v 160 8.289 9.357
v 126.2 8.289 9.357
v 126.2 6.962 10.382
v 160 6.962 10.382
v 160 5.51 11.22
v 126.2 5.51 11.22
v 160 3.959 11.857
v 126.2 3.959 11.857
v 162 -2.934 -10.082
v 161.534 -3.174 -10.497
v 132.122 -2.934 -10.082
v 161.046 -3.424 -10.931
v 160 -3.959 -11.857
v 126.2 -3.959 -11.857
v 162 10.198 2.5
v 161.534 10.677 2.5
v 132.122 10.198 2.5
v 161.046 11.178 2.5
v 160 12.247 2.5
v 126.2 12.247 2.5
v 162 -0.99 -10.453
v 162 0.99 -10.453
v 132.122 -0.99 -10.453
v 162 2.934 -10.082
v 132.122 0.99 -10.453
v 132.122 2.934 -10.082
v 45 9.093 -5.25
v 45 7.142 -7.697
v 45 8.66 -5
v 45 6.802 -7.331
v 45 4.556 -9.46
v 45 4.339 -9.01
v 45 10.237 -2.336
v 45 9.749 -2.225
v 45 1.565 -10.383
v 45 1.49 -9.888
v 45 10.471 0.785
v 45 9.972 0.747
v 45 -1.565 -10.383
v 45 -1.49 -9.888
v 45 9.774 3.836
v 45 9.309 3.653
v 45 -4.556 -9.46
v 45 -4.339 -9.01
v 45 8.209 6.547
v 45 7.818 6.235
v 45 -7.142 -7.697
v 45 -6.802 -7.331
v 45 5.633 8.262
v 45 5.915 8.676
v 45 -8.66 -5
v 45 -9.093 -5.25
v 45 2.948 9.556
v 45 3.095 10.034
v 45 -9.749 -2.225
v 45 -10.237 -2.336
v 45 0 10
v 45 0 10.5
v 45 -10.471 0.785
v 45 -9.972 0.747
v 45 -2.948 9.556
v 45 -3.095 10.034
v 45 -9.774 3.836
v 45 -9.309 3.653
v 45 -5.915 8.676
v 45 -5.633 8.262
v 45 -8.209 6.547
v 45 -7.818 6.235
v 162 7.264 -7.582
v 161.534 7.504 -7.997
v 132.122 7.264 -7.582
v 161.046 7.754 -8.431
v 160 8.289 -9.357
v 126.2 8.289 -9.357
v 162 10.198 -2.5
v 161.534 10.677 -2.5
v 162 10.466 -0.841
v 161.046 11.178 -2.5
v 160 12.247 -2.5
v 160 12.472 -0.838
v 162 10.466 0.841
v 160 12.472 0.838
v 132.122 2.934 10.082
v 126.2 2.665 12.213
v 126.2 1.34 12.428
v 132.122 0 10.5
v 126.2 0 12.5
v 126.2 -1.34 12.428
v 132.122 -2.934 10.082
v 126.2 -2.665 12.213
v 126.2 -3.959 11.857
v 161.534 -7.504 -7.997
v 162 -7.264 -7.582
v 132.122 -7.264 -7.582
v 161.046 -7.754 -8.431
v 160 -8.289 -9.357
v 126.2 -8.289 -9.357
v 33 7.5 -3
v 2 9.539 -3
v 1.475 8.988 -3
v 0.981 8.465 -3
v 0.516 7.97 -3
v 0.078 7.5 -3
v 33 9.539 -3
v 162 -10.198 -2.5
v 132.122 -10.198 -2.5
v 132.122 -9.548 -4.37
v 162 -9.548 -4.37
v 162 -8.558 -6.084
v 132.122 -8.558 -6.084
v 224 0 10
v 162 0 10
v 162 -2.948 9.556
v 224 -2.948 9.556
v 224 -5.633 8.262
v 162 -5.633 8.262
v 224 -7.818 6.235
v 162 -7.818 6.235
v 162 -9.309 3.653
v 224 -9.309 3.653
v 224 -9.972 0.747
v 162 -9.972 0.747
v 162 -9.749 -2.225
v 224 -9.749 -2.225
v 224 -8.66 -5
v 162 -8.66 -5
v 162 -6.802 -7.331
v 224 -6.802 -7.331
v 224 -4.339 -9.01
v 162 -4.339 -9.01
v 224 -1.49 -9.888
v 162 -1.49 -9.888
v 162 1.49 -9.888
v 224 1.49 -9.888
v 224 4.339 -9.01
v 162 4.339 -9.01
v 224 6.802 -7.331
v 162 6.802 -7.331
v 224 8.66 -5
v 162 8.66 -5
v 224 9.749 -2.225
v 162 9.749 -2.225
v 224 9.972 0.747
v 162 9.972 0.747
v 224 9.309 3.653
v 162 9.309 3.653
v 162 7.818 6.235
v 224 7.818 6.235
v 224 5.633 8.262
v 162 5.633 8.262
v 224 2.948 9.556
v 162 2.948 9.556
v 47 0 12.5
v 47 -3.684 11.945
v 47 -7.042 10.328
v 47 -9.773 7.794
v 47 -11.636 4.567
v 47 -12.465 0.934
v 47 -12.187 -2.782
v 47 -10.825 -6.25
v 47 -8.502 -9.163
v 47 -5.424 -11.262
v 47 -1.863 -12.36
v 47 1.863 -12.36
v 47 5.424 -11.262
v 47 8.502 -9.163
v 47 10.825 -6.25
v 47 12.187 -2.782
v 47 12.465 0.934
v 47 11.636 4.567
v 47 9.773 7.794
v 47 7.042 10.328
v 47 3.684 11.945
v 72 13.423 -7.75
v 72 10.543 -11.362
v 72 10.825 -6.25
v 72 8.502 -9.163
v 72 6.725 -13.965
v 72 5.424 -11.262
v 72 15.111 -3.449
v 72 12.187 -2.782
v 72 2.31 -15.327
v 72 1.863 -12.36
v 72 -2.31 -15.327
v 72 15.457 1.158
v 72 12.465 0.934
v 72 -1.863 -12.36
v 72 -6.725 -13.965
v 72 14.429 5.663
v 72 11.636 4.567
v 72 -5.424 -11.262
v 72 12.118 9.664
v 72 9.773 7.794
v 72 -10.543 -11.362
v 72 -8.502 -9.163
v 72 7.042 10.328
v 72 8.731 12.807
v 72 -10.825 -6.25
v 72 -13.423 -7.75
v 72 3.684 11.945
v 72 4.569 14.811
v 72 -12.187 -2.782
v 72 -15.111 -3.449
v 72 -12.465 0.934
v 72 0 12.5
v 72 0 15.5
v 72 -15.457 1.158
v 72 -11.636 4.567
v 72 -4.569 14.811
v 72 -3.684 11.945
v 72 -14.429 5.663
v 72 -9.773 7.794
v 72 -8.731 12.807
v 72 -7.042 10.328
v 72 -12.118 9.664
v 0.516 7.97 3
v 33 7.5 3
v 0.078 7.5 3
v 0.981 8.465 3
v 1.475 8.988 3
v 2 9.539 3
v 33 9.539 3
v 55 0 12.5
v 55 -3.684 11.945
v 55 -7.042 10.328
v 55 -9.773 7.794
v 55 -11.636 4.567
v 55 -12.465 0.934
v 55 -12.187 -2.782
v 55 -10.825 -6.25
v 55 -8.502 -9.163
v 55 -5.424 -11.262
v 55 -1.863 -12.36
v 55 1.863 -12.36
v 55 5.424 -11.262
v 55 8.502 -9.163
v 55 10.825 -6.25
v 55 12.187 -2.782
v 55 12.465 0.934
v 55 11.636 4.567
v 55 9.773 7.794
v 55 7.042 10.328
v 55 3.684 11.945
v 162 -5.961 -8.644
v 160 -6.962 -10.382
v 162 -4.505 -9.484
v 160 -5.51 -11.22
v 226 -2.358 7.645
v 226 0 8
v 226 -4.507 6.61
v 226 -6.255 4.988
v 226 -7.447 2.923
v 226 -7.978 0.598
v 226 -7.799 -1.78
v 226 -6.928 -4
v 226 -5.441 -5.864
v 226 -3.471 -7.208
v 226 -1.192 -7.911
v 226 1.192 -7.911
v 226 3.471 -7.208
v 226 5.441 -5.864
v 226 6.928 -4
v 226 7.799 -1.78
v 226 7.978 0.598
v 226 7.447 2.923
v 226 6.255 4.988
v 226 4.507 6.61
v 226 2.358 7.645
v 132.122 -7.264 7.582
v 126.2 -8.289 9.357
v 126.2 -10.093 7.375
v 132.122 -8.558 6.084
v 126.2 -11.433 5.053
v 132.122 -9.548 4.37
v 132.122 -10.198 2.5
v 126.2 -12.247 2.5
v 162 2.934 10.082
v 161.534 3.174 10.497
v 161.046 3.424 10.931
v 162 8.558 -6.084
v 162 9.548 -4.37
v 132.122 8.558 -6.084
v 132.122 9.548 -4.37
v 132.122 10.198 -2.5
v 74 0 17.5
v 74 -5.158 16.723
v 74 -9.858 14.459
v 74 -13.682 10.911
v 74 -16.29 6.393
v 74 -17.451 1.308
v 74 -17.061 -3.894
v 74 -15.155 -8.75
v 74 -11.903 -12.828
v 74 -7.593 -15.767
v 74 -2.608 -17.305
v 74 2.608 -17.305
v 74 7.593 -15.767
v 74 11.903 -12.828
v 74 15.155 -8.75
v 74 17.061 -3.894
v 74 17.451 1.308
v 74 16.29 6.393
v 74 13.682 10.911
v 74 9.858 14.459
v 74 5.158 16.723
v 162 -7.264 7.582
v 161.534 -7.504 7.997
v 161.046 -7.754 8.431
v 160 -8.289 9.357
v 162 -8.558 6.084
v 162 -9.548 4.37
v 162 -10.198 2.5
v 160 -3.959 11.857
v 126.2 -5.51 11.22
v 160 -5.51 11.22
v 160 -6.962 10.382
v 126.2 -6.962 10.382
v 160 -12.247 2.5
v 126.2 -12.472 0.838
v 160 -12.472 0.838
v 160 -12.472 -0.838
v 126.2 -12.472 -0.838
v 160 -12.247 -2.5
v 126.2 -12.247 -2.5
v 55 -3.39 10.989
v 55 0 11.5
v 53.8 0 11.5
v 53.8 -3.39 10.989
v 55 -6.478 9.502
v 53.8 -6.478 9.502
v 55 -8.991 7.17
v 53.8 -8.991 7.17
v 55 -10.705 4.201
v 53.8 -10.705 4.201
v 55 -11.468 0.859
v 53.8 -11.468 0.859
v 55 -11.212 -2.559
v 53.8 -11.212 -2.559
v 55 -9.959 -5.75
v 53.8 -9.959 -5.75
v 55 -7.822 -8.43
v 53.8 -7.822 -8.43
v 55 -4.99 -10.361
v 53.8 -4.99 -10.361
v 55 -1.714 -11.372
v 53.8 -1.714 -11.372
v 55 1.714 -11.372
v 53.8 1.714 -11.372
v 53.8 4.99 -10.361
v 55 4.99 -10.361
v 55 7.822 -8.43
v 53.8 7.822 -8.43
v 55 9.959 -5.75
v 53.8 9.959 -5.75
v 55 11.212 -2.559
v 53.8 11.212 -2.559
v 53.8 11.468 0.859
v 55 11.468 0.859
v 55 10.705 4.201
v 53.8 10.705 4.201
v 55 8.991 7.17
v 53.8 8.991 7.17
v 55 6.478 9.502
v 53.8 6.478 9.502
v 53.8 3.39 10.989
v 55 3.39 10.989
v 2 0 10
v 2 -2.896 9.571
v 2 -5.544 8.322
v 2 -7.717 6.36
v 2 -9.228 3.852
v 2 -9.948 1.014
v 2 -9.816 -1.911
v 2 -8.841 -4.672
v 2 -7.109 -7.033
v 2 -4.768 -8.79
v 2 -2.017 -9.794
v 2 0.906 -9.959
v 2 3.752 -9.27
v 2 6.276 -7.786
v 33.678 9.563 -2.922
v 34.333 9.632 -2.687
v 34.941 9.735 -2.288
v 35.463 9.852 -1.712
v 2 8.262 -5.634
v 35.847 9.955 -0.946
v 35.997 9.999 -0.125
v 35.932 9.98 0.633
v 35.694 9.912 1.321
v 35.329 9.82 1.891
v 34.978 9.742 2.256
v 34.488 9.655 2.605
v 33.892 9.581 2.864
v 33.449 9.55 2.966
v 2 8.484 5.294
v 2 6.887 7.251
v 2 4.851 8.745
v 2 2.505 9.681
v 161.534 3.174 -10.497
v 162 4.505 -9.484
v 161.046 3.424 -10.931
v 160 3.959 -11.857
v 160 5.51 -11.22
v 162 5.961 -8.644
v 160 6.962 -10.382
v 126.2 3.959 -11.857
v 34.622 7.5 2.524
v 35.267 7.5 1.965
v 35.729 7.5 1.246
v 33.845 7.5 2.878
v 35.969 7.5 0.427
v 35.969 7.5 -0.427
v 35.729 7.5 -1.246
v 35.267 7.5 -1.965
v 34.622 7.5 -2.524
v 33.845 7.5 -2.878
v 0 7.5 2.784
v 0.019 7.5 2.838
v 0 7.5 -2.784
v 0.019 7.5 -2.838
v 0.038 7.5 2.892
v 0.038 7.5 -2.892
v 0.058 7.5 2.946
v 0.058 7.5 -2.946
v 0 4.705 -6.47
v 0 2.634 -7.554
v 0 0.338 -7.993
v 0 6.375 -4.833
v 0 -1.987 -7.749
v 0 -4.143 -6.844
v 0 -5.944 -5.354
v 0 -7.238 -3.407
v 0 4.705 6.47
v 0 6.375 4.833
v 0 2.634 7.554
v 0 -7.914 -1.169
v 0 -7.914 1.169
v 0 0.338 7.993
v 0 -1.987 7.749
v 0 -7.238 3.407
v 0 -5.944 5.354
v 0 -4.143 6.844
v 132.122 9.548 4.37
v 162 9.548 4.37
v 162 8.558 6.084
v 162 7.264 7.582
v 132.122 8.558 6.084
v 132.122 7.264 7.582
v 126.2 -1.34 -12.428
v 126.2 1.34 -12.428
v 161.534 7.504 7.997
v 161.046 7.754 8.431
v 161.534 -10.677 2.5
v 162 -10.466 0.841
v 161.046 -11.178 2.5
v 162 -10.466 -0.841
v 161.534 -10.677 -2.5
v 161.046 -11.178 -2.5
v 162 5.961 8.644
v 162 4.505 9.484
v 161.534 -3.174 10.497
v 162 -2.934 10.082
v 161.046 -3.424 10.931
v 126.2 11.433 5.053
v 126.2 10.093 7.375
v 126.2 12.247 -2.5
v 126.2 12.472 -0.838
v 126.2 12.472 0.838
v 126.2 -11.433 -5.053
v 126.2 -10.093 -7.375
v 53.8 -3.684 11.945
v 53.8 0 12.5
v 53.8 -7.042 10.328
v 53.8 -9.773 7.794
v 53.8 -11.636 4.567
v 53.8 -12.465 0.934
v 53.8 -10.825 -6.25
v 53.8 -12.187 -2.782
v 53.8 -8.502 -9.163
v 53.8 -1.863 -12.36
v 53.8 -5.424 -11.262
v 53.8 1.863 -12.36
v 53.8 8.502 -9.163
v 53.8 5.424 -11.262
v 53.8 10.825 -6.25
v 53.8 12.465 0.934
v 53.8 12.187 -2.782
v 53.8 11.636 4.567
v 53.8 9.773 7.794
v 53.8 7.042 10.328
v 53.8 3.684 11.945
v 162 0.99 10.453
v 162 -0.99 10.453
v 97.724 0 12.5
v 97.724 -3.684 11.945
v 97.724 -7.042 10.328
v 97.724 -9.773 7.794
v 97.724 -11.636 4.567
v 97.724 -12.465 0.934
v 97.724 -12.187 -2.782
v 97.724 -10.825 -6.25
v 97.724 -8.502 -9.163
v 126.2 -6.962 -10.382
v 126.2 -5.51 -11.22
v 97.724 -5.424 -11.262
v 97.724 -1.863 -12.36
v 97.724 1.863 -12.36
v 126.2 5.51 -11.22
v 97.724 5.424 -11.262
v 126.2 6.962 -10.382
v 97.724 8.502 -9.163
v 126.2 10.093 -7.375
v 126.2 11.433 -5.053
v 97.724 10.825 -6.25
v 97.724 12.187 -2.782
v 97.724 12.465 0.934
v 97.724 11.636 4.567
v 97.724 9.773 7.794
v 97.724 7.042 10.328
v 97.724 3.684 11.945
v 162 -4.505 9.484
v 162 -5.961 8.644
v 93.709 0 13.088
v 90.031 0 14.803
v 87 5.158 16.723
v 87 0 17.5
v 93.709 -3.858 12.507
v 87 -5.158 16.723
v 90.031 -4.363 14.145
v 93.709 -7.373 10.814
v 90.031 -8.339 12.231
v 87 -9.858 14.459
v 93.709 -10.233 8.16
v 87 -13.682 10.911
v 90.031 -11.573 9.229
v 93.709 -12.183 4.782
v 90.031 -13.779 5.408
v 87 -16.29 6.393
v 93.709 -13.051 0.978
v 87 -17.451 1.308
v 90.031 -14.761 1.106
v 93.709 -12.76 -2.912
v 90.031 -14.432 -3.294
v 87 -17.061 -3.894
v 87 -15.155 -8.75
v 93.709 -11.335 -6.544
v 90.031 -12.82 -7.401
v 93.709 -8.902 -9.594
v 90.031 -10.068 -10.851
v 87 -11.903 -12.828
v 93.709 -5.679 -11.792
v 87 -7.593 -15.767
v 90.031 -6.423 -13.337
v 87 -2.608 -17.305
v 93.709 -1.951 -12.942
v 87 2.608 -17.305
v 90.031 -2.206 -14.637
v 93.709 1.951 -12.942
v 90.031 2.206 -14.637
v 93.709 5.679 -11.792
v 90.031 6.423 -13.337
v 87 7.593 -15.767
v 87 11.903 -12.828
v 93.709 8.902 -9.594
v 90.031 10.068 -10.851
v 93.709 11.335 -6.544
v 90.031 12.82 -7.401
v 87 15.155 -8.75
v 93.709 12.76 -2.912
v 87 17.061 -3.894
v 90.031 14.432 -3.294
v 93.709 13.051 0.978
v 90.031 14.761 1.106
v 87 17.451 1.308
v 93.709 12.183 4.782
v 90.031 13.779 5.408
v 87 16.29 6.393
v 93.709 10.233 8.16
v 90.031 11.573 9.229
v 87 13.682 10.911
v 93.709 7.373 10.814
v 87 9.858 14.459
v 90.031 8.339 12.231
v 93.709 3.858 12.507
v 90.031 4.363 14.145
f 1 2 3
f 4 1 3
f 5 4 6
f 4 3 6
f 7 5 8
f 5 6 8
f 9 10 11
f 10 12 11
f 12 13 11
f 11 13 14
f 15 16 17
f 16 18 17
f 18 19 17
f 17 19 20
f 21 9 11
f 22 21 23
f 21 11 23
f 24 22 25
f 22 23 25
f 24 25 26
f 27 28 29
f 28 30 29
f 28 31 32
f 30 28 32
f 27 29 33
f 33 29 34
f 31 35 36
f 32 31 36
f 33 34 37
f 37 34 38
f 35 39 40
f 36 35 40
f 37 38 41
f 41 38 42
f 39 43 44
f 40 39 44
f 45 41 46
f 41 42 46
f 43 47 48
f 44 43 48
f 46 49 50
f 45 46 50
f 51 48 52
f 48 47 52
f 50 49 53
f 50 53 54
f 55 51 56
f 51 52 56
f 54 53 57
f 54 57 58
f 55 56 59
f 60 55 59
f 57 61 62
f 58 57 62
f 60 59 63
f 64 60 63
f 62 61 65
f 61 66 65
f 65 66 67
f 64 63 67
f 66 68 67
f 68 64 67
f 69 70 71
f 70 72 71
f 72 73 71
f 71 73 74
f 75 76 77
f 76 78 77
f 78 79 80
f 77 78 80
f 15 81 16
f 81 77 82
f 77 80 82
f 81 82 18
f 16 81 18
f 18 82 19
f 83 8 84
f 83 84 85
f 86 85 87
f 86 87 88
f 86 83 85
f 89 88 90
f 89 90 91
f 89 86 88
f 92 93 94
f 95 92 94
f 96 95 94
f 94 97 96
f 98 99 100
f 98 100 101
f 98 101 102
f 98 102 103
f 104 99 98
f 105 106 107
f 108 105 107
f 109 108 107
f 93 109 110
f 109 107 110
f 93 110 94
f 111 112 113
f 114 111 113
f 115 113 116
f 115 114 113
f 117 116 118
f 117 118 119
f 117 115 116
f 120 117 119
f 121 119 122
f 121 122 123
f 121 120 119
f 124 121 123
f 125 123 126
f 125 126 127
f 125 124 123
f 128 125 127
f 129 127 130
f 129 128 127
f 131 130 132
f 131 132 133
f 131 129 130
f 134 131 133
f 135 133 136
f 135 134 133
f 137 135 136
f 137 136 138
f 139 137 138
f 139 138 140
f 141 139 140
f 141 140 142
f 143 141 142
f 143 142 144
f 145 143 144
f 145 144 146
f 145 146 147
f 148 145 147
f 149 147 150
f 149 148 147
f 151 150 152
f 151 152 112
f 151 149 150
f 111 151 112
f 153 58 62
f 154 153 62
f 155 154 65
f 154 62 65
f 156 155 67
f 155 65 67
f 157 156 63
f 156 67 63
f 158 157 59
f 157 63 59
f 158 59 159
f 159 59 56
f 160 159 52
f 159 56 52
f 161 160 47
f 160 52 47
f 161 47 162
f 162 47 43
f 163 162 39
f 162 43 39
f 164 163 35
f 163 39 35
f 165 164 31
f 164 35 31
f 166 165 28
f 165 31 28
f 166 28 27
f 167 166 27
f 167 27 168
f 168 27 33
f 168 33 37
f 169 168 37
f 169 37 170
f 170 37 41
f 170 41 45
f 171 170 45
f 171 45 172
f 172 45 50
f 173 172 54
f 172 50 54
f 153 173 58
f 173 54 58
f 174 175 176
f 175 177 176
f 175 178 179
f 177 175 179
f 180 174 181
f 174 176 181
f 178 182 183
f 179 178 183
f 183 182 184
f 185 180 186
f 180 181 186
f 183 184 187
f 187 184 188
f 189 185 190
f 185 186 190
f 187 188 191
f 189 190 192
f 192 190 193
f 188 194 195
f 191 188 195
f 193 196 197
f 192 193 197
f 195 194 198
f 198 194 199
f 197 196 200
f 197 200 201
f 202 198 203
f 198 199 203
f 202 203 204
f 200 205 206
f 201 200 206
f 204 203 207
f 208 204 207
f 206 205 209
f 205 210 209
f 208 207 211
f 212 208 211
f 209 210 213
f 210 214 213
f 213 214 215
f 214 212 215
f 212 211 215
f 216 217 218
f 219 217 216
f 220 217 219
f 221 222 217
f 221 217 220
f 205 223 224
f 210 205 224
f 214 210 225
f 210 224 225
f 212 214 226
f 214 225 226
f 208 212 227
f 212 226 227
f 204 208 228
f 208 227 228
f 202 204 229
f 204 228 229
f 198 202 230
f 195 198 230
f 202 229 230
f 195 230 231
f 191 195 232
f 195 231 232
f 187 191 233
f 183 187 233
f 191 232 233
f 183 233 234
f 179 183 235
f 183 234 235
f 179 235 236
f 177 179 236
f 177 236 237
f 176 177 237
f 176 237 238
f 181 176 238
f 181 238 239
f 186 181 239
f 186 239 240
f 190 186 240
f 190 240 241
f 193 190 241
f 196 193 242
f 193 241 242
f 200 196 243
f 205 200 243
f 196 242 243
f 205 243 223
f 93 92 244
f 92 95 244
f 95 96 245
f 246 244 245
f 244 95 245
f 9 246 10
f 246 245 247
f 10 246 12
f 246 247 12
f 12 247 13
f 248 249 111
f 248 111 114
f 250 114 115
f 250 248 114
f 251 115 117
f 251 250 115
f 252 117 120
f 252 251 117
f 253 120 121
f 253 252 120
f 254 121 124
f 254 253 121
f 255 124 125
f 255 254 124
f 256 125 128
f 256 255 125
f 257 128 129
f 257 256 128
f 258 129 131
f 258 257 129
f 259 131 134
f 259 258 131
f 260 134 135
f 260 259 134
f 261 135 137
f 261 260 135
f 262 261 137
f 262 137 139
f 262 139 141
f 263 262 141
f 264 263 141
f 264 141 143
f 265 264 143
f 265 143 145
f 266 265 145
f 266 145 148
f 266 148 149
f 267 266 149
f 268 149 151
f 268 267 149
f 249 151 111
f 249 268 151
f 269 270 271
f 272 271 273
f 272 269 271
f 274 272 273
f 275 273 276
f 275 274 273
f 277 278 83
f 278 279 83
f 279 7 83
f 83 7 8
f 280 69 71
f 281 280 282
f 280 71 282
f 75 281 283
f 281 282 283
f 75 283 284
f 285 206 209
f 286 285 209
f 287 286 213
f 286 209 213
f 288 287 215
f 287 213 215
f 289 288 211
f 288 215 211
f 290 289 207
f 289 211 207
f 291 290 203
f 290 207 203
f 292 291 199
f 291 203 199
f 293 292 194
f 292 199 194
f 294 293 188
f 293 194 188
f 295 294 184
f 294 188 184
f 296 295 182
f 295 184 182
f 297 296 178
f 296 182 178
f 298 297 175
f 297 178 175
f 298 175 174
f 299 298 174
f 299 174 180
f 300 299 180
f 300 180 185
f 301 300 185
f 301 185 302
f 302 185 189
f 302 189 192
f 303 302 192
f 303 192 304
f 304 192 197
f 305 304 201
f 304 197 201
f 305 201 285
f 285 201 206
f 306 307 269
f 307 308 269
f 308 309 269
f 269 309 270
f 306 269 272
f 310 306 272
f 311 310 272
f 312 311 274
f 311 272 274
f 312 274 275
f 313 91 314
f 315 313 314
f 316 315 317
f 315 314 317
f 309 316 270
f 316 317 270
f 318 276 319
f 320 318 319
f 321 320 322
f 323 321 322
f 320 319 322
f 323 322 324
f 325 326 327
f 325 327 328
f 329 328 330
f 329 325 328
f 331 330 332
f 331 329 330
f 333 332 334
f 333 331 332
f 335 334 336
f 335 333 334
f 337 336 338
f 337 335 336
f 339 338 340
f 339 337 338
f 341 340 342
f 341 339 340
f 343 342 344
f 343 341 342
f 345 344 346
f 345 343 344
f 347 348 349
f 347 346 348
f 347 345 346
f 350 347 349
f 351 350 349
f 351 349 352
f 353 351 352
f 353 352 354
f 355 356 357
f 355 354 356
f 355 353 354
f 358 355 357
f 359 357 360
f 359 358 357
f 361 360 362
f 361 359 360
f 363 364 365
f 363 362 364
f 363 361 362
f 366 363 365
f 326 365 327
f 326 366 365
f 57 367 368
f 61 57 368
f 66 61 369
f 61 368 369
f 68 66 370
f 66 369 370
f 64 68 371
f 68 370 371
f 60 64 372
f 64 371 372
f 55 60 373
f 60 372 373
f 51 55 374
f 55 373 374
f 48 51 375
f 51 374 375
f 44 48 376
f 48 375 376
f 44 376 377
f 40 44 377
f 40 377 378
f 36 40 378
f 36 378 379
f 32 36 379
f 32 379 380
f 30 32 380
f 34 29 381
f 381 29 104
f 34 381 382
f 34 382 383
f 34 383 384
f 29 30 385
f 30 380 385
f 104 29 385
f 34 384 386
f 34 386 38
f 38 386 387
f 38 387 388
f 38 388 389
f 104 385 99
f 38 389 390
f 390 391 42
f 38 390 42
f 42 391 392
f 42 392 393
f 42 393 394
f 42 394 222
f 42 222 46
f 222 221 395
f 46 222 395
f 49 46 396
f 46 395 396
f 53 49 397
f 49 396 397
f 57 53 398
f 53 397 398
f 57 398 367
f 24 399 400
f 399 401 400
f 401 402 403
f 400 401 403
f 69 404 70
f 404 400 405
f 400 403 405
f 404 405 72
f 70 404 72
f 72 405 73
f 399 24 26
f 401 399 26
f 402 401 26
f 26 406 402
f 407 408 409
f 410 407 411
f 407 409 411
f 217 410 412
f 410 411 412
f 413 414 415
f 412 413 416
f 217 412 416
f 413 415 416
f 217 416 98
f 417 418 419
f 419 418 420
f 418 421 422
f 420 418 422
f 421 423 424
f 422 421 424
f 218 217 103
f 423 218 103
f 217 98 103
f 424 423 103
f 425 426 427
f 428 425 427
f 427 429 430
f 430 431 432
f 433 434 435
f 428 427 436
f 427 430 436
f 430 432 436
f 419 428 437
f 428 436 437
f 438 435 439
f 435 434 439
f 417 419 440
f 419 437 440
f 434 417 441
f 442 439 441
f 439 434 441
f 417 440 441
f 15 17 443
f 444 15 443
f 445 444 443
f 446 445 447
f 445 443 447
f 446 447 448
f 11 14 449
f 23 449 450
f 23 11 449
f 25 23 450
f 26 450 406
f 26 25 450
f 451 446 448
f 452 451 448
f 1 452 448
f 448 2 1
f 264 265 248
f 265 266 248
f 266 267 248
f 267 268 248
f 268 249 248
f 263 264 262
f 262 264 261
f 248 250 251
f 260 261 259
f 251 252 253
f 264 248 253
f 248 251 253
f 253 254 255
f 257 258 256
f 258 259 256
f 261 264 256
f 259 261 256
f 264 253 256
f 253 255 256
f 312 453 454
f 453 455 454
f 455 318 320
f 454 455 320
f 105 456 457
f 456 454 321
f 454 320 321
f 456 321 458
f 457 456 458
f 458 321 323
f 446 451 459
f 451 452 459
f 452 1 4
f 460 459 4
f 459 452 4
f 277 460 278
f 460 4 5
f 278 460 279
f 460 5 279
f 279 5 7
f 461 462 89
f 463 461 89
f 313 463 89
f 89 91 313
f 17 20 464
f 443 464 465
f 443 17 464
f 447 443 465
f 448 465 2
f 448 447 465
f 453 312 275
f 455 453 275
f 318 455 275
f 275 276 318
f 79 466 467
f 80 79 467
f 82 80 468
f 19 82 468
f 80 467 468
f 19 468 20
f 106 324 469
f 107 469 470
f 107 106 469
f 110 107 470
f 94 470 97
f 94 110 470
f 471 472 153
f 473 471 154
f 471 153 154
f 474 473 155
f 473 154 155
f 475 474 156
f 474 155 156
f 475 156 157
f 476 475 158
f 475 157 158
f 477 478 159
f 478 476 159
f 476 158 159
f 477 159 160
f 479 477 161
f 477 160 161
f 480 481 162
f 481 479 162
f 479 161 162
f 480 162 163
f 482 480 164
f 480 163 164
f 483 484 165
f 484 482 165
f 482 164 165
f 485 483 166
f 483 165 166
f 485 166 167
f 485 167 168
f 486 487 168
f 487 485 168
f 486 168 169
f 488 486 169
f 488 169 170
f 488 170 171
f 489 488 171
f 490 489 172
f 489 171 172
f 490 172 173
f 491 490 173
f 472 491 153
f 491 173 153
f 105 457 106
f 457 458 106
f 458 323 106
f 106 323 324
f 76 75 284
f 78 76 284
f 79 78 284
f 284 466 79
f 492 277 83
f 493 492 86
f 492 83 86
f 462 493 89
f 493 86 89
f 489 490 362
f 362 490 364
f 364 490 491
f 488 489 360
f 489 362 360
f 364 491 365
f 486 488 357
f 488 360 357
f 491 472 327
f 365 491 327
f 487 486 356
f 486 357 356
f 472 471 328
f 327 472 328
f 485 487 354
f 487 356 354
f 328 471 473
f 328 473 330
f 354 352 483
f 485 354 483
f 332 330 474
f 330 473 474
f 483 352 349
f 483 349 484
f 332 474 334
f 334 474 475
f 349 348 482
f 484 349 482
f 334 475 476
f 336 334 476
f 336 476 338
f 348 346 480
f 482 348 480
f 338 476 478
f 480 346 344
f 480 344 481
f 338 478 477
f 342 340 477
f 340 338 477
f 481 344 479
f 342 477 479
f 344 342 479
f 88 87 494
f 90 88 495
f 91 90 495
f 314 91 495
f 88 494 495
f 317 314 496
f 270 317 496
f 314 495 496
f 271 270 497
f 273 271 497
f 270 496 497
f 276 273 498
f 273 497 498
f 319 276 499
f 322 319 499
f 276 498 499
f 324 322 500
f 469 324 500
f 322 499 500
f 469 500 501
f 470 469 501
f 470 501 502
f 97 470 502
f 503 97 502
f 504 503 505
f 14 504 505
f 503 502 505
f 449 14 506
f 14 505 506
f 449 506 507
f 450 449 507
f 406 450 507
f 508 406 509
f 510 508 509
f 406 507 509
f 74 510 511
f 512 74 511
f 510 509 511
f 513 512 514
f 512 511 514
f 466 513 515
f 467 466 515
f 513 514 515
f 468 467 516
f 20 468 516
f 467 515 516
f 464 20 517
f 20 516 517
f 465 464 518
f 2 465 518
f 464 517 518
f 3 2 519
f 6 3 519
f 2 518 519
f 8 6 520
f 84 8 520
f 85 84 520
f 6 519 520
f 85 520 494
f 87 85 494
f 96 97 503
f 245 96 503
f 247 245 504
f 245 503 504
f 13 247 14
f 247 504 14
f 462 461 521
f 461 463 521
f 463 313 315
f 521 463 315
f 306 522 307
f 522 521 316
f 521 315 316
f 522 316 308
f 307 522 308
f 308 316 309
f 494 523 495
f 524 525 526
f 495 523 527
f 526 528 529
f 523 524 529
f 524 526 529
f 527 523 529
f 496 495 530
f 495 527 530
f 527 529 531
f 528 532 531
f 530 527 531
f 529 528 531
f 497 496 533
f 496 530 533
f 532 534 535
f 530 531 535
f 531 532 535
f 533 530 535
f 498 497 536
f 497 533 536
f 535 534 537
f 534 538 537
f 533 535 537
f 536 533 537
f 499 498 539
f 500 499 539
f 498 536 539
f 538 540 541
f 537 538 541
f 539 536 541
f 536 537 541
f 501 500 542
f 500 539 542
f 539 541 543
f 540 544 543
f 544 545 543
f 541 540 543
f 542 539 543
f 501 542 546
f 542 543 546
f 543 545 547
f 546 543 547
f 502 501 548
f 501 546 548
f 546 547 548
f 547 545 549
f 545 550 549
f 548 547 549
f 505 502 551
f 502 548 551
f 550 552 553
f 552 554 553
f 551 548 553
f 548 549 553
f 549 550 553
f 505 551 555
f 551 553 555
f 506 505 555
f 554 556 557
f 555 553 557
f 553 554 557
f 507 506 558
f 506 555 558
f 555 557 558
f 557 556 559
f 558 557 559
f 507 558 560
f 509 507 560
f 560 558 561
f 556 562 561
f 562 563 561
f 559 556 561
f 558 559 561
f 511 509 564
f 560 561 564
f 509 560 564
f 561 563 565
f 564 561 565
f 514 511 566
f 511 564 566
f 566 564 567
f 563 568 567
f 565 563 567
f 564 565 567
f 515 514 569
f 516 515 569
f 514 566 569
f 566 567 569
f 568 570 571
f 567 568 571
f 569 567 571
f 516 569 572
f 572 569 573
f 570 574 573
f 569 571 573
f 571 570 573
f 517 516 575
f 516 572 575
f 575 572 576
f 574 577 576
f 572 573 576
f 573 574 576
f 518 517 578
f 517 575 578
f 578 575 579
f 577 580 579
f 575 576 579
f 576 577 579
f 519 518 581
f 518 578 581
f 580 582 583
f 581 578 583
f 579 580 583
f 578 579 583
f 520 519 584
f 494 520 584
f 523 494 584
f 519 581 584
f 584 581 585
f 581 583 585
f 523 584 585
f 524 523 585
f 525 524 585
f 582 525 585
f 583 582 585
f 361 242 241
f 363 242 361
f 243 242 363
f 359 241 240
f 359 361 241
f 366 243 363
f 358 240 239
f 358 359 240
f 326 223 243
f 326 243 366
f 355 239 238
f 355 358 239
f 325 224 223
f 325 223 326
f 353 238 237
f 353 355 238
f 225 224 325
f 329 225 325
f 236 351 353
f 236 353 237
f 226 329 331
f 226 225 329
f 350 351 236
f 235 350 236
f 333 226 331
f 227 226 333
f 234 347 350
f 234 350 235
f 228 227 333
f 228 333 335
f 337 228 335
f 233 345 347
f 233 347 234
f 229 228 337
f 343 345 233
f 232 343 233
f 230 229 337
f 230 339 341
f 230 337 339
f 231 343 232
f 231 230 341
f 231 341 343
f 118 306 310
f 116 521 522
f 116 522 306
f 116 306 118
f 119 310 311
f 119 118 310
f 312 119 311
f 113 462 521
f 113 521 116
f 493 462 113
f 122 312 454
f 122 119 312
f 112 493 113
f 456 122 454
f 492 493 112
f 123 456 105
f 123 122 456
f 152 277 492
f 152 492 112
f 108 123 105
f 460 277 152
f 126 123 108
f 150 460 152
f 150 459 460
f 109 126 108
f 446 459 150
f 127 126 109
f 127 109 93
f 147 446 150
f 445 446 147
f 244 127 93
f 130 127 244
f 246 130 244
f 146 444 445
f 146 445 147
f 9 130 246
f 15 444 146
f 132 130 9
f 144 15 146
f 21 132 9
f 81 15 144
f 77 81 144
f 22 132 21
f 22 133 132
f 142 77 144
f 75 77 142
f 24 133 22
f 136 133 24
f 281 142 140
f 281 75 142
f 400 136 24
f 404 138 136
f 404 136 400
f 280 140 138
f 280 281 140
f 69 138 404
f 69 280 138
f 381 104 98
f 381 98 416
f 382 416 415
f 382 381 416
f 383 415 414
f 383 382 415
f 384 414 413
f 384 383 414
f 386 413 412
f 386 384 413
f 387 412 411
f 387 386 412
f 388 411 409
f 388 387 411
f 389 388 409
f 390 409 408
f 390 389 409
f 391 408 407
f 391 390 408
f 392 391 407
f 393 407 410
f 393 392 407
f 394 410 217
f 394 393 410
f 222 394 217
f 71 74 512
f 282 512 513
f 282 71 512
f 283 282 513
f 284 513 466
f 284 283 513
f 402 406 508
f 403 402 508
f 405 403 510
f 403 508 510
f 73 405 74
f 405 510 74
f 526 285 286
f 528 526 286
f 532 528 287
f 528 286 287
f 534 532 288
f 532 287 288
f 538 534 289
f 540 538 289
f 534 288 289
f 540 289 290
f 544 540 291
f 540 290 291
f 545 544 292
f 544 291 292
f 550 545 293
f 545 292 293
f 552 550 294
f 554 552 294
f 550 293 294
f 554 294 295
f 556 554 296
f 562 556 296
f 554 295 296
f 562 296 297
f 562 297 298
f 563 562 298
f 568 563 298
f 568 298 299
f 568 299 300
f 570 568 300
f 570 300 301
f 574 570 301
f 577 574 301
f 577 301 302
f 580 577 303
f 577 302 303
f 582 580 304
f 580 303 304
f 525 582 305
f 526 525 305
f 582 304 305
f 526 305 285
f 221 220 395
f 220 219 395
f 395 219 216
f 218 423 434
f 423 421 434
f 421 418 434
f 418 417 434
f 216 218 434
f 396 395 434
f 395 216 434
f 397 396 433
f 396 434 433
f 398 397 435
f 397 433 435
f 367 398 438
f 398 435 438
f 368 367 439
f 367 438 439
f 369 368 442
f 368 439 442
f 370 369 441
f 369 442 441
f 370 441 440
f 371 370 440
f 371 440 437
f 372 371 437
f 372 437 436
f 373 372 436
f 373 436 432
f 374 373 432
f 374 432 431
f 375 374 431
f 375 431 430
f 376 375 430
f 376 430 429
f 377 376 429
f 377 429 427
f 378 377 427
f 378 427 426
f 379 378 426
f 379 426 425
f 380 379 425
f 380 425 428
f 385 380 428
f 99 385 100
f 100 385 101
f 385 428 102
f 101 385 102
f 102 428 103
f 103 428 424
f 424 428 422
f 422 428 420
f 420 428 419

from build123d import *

# Parameters (mm, degrees)
CUT_EXTRUDE_START   = 10
CUT_EXTRUDE_1_DEPTH = 2.5
SKETCH_4_W          = 1.2
SKETCH_4_H          = 1
EXTRUDE_START       = -99.8
EXTRUDE_11_DEPTH    = 35.8
CHAMFER_1_SIZE      = 2


with BuildPart() as part:
    # 草图1 → 旋转1 (revolve)
    with BuildSketch(Plane.XY, mode=Mode.PRIVATE) as revolve_1_sk:
        with BuildLine():
            Line((0, 10), (0, 0))
            Line((0, 0), (226, 0))
            Line((226, 0), (226, 10))
            Line((226, 10), (162, 10))
            Line((162, 10), (162, 12.5))
            Line((162, 12.5), (97.723805295, 12.5))
            ThreePointArc((97.723805295, 12.5), (91.807725512, 13.81142246), (87, 17.5))
            Line((87, 17.5), (72, 17.5))
            Line((72, 17.5), (72, 12.5))
            Line((72, 12.5), (45, 12.5))
            Line((45, 12.5), (45, 10))
            Line((45, 10), (0, 10))
        make_face()
    revolve(revolve_1_sk.sketch.rotate(Axis((0, 0, 0), (1, 0, 0)), 90), axis=Axis((0, 0, 0), (1, 0, 0)))

    # 草图3 → 切除-拉伸1 (cut)
    with BuildSketch(Plane(origin=(0, 0, 0), x_dir=(1, 0, 0), z_dir=(0, 1, 0)).offset(CUT_EXTRUDE_START)):
        with BuildLine():
            Line((-33, 3), (33, 3))
            ThreePointArc((33, 3), (36, 0), (33, -3))
            Line((33, -3), (-33, -3))
            ThreePointArc((-33, -3), (-36, 0), (-33, 3))
        make_face()
    extrude(amount=-CUT_EXTRUDE_1_DEPTH, mode=Mode.SUBTRACT)

    # 草图4 → 切除-旋转1 (revolve, cut)
    with BuildSketch(Plane.XY, mode=Mode.PRIVATE) as cut_revolve_1_sk:
        with Locations((54.4, 12)):
            Rectangle(SKETCH_4_W, SKETCH_4_H)
        with Locations((54.4, -12)):
            Rectangle(SKETCH_4_W, SKETCH_4_H)
    revolve(cut_revolve_1_sk.sketch.rotate(Axis((0, 0, 0), (1, 0, 0)), 90), axis=Axis((0, 0, 0), (1, 0, 0)), mode=Mode.SUBTRACT)

    # 草图5 → 切除-旋转2 (revolve, cut)
    with BuildSketch(Plane.XY, mode=Mode.PRIVATE) as cut_revolve_2_sk:
        with BuildLine():
            Line((162, 12.5), (126.2, 12.5))
            ThreePointArc((126.2, 12.5), (131.507077415, 10.633014138), (137.097247359, 10))
            Line((137.097247359, 10), (162, 10))
            Line((162, 10), (162, 12.5))
        make_face()
    revolve(cut_revolve_2_sk.sketch.rotate(Axis((0, 0, 0), (1, 0, 0)), 90), axis=Axis((0, 0, 0), (1, 0, 0)), mode=Mode.SUBTRACT)

    # 草图8 → 凸台-拉伸11 (add)
    with BuildSketch(Plane(origin=(226, 0, 0), x_dir=(0, 0, -1), z_dir=(1, 0, 0)).offset(EXTRUDE_START)):
        with BuildLine():
            Line((9.356601718, 8.288787866), (7.581760866, 7.264083023))
            ThreePointArc((7.581760866, 7.264083023), (5.25, 9.09326674), (2.5, 10.198039027))
            Line((2.5, 10.198039027), (2.5, 12.247448714))
            ThreePointArc((2.5, 12.247448714), (0, 12.5), (-2.5, 12.247448714))
            Line((-2.5, 12.247448714), (-2.5, 10.198039027))
            ThreePointArc((-2.5, 10.198039027), (-5.25, 9.09326674), (-7.581760866, 7.264083023))
            Line((-7.581760866, 7.264083023), (-9.356601718, 8.288787866))
            ThreePointArc((-9.356601718, 8.288787866), (-10.825317547, 6.25), (-11.856601718, 3.958660847))
            Line((-11.856601718, 3.958660847), (-10.081760866, 2.933956004))
            ThreePointArc((-10.081760866, 2.933956004), (-10.5, 0), (-10.081760866, -2.933956004))
            Line((-10.081760866, -2.933956004), (-11.856601718, -3.958660847))
            ThreePointArc((-11.856601718, -3.958660847), (-10.825317547, -6.25), (-9.356601718, -8.288787866))
            Line((-9.356601718, -8.288787866), (-7.581760866, -7.264083023))
            ThreePointArc((-7.581760866, -7.264083023), (-5.25, -9.09326674), (-2.5, -10.198039027))
            Line((-2.5, -10.198039027), (-2.5, -12.247448714))
            ThreePointArc((-2.5, -12.247448714), (0, -12.5), (2.5, -12.247448714))
            Line((2.5, -12.247448714), (2.5, -10.198039027))
            ThreePointArc((2.5, -10.198039027), (5.25, -9.09326674), (7.581760866, -7.264083023))
            Line((7.581760866, -7.264083023), (9.356601718, -8.288787866))
            ThreePointArc((9.356601718, -8.288787866), (10.825317547, -6.25), (11.856601718, -3.958660847))
            Line((11.856601718, -3.958660847), (10.081760866, -2.933956004))
            ThreePointArc((10.081760866, -2.933956004), (10.5, 0), (10.081760866, 2.933956004))
            Line((10.081760866, 2.933956004), (11.856601718, 3.958660847))
            ThreePointArc((11.856601718, 3.958660847), (10.825317547, 6.25), (9.356601718, 8.288787866))
        make_face()
    extrude(amount=EXTRUDE_11_DEPTH)

    # 倒角1
    chamfer_1_edges = [part.edges().sort_by_distance(p)[0] for p in [
        (226, 0, -10),
        (162, 6.25, -10.825317547),
        (162, -6.25, -10.825317547),
        (162, -12.5, 0),
        (162, -6.25, 10.825317547),
        (162, 6.25, 10.825317547),
        (162, 12.5, 0),
        (72, 0, -17.5),
        (45, 0, -12.5),
        (0, -8.062257748, -5.916079783),
    ]]
    chamfer(chamfer_1_edges, length=CHAMFER_1_SIZE)


solid = part.part
